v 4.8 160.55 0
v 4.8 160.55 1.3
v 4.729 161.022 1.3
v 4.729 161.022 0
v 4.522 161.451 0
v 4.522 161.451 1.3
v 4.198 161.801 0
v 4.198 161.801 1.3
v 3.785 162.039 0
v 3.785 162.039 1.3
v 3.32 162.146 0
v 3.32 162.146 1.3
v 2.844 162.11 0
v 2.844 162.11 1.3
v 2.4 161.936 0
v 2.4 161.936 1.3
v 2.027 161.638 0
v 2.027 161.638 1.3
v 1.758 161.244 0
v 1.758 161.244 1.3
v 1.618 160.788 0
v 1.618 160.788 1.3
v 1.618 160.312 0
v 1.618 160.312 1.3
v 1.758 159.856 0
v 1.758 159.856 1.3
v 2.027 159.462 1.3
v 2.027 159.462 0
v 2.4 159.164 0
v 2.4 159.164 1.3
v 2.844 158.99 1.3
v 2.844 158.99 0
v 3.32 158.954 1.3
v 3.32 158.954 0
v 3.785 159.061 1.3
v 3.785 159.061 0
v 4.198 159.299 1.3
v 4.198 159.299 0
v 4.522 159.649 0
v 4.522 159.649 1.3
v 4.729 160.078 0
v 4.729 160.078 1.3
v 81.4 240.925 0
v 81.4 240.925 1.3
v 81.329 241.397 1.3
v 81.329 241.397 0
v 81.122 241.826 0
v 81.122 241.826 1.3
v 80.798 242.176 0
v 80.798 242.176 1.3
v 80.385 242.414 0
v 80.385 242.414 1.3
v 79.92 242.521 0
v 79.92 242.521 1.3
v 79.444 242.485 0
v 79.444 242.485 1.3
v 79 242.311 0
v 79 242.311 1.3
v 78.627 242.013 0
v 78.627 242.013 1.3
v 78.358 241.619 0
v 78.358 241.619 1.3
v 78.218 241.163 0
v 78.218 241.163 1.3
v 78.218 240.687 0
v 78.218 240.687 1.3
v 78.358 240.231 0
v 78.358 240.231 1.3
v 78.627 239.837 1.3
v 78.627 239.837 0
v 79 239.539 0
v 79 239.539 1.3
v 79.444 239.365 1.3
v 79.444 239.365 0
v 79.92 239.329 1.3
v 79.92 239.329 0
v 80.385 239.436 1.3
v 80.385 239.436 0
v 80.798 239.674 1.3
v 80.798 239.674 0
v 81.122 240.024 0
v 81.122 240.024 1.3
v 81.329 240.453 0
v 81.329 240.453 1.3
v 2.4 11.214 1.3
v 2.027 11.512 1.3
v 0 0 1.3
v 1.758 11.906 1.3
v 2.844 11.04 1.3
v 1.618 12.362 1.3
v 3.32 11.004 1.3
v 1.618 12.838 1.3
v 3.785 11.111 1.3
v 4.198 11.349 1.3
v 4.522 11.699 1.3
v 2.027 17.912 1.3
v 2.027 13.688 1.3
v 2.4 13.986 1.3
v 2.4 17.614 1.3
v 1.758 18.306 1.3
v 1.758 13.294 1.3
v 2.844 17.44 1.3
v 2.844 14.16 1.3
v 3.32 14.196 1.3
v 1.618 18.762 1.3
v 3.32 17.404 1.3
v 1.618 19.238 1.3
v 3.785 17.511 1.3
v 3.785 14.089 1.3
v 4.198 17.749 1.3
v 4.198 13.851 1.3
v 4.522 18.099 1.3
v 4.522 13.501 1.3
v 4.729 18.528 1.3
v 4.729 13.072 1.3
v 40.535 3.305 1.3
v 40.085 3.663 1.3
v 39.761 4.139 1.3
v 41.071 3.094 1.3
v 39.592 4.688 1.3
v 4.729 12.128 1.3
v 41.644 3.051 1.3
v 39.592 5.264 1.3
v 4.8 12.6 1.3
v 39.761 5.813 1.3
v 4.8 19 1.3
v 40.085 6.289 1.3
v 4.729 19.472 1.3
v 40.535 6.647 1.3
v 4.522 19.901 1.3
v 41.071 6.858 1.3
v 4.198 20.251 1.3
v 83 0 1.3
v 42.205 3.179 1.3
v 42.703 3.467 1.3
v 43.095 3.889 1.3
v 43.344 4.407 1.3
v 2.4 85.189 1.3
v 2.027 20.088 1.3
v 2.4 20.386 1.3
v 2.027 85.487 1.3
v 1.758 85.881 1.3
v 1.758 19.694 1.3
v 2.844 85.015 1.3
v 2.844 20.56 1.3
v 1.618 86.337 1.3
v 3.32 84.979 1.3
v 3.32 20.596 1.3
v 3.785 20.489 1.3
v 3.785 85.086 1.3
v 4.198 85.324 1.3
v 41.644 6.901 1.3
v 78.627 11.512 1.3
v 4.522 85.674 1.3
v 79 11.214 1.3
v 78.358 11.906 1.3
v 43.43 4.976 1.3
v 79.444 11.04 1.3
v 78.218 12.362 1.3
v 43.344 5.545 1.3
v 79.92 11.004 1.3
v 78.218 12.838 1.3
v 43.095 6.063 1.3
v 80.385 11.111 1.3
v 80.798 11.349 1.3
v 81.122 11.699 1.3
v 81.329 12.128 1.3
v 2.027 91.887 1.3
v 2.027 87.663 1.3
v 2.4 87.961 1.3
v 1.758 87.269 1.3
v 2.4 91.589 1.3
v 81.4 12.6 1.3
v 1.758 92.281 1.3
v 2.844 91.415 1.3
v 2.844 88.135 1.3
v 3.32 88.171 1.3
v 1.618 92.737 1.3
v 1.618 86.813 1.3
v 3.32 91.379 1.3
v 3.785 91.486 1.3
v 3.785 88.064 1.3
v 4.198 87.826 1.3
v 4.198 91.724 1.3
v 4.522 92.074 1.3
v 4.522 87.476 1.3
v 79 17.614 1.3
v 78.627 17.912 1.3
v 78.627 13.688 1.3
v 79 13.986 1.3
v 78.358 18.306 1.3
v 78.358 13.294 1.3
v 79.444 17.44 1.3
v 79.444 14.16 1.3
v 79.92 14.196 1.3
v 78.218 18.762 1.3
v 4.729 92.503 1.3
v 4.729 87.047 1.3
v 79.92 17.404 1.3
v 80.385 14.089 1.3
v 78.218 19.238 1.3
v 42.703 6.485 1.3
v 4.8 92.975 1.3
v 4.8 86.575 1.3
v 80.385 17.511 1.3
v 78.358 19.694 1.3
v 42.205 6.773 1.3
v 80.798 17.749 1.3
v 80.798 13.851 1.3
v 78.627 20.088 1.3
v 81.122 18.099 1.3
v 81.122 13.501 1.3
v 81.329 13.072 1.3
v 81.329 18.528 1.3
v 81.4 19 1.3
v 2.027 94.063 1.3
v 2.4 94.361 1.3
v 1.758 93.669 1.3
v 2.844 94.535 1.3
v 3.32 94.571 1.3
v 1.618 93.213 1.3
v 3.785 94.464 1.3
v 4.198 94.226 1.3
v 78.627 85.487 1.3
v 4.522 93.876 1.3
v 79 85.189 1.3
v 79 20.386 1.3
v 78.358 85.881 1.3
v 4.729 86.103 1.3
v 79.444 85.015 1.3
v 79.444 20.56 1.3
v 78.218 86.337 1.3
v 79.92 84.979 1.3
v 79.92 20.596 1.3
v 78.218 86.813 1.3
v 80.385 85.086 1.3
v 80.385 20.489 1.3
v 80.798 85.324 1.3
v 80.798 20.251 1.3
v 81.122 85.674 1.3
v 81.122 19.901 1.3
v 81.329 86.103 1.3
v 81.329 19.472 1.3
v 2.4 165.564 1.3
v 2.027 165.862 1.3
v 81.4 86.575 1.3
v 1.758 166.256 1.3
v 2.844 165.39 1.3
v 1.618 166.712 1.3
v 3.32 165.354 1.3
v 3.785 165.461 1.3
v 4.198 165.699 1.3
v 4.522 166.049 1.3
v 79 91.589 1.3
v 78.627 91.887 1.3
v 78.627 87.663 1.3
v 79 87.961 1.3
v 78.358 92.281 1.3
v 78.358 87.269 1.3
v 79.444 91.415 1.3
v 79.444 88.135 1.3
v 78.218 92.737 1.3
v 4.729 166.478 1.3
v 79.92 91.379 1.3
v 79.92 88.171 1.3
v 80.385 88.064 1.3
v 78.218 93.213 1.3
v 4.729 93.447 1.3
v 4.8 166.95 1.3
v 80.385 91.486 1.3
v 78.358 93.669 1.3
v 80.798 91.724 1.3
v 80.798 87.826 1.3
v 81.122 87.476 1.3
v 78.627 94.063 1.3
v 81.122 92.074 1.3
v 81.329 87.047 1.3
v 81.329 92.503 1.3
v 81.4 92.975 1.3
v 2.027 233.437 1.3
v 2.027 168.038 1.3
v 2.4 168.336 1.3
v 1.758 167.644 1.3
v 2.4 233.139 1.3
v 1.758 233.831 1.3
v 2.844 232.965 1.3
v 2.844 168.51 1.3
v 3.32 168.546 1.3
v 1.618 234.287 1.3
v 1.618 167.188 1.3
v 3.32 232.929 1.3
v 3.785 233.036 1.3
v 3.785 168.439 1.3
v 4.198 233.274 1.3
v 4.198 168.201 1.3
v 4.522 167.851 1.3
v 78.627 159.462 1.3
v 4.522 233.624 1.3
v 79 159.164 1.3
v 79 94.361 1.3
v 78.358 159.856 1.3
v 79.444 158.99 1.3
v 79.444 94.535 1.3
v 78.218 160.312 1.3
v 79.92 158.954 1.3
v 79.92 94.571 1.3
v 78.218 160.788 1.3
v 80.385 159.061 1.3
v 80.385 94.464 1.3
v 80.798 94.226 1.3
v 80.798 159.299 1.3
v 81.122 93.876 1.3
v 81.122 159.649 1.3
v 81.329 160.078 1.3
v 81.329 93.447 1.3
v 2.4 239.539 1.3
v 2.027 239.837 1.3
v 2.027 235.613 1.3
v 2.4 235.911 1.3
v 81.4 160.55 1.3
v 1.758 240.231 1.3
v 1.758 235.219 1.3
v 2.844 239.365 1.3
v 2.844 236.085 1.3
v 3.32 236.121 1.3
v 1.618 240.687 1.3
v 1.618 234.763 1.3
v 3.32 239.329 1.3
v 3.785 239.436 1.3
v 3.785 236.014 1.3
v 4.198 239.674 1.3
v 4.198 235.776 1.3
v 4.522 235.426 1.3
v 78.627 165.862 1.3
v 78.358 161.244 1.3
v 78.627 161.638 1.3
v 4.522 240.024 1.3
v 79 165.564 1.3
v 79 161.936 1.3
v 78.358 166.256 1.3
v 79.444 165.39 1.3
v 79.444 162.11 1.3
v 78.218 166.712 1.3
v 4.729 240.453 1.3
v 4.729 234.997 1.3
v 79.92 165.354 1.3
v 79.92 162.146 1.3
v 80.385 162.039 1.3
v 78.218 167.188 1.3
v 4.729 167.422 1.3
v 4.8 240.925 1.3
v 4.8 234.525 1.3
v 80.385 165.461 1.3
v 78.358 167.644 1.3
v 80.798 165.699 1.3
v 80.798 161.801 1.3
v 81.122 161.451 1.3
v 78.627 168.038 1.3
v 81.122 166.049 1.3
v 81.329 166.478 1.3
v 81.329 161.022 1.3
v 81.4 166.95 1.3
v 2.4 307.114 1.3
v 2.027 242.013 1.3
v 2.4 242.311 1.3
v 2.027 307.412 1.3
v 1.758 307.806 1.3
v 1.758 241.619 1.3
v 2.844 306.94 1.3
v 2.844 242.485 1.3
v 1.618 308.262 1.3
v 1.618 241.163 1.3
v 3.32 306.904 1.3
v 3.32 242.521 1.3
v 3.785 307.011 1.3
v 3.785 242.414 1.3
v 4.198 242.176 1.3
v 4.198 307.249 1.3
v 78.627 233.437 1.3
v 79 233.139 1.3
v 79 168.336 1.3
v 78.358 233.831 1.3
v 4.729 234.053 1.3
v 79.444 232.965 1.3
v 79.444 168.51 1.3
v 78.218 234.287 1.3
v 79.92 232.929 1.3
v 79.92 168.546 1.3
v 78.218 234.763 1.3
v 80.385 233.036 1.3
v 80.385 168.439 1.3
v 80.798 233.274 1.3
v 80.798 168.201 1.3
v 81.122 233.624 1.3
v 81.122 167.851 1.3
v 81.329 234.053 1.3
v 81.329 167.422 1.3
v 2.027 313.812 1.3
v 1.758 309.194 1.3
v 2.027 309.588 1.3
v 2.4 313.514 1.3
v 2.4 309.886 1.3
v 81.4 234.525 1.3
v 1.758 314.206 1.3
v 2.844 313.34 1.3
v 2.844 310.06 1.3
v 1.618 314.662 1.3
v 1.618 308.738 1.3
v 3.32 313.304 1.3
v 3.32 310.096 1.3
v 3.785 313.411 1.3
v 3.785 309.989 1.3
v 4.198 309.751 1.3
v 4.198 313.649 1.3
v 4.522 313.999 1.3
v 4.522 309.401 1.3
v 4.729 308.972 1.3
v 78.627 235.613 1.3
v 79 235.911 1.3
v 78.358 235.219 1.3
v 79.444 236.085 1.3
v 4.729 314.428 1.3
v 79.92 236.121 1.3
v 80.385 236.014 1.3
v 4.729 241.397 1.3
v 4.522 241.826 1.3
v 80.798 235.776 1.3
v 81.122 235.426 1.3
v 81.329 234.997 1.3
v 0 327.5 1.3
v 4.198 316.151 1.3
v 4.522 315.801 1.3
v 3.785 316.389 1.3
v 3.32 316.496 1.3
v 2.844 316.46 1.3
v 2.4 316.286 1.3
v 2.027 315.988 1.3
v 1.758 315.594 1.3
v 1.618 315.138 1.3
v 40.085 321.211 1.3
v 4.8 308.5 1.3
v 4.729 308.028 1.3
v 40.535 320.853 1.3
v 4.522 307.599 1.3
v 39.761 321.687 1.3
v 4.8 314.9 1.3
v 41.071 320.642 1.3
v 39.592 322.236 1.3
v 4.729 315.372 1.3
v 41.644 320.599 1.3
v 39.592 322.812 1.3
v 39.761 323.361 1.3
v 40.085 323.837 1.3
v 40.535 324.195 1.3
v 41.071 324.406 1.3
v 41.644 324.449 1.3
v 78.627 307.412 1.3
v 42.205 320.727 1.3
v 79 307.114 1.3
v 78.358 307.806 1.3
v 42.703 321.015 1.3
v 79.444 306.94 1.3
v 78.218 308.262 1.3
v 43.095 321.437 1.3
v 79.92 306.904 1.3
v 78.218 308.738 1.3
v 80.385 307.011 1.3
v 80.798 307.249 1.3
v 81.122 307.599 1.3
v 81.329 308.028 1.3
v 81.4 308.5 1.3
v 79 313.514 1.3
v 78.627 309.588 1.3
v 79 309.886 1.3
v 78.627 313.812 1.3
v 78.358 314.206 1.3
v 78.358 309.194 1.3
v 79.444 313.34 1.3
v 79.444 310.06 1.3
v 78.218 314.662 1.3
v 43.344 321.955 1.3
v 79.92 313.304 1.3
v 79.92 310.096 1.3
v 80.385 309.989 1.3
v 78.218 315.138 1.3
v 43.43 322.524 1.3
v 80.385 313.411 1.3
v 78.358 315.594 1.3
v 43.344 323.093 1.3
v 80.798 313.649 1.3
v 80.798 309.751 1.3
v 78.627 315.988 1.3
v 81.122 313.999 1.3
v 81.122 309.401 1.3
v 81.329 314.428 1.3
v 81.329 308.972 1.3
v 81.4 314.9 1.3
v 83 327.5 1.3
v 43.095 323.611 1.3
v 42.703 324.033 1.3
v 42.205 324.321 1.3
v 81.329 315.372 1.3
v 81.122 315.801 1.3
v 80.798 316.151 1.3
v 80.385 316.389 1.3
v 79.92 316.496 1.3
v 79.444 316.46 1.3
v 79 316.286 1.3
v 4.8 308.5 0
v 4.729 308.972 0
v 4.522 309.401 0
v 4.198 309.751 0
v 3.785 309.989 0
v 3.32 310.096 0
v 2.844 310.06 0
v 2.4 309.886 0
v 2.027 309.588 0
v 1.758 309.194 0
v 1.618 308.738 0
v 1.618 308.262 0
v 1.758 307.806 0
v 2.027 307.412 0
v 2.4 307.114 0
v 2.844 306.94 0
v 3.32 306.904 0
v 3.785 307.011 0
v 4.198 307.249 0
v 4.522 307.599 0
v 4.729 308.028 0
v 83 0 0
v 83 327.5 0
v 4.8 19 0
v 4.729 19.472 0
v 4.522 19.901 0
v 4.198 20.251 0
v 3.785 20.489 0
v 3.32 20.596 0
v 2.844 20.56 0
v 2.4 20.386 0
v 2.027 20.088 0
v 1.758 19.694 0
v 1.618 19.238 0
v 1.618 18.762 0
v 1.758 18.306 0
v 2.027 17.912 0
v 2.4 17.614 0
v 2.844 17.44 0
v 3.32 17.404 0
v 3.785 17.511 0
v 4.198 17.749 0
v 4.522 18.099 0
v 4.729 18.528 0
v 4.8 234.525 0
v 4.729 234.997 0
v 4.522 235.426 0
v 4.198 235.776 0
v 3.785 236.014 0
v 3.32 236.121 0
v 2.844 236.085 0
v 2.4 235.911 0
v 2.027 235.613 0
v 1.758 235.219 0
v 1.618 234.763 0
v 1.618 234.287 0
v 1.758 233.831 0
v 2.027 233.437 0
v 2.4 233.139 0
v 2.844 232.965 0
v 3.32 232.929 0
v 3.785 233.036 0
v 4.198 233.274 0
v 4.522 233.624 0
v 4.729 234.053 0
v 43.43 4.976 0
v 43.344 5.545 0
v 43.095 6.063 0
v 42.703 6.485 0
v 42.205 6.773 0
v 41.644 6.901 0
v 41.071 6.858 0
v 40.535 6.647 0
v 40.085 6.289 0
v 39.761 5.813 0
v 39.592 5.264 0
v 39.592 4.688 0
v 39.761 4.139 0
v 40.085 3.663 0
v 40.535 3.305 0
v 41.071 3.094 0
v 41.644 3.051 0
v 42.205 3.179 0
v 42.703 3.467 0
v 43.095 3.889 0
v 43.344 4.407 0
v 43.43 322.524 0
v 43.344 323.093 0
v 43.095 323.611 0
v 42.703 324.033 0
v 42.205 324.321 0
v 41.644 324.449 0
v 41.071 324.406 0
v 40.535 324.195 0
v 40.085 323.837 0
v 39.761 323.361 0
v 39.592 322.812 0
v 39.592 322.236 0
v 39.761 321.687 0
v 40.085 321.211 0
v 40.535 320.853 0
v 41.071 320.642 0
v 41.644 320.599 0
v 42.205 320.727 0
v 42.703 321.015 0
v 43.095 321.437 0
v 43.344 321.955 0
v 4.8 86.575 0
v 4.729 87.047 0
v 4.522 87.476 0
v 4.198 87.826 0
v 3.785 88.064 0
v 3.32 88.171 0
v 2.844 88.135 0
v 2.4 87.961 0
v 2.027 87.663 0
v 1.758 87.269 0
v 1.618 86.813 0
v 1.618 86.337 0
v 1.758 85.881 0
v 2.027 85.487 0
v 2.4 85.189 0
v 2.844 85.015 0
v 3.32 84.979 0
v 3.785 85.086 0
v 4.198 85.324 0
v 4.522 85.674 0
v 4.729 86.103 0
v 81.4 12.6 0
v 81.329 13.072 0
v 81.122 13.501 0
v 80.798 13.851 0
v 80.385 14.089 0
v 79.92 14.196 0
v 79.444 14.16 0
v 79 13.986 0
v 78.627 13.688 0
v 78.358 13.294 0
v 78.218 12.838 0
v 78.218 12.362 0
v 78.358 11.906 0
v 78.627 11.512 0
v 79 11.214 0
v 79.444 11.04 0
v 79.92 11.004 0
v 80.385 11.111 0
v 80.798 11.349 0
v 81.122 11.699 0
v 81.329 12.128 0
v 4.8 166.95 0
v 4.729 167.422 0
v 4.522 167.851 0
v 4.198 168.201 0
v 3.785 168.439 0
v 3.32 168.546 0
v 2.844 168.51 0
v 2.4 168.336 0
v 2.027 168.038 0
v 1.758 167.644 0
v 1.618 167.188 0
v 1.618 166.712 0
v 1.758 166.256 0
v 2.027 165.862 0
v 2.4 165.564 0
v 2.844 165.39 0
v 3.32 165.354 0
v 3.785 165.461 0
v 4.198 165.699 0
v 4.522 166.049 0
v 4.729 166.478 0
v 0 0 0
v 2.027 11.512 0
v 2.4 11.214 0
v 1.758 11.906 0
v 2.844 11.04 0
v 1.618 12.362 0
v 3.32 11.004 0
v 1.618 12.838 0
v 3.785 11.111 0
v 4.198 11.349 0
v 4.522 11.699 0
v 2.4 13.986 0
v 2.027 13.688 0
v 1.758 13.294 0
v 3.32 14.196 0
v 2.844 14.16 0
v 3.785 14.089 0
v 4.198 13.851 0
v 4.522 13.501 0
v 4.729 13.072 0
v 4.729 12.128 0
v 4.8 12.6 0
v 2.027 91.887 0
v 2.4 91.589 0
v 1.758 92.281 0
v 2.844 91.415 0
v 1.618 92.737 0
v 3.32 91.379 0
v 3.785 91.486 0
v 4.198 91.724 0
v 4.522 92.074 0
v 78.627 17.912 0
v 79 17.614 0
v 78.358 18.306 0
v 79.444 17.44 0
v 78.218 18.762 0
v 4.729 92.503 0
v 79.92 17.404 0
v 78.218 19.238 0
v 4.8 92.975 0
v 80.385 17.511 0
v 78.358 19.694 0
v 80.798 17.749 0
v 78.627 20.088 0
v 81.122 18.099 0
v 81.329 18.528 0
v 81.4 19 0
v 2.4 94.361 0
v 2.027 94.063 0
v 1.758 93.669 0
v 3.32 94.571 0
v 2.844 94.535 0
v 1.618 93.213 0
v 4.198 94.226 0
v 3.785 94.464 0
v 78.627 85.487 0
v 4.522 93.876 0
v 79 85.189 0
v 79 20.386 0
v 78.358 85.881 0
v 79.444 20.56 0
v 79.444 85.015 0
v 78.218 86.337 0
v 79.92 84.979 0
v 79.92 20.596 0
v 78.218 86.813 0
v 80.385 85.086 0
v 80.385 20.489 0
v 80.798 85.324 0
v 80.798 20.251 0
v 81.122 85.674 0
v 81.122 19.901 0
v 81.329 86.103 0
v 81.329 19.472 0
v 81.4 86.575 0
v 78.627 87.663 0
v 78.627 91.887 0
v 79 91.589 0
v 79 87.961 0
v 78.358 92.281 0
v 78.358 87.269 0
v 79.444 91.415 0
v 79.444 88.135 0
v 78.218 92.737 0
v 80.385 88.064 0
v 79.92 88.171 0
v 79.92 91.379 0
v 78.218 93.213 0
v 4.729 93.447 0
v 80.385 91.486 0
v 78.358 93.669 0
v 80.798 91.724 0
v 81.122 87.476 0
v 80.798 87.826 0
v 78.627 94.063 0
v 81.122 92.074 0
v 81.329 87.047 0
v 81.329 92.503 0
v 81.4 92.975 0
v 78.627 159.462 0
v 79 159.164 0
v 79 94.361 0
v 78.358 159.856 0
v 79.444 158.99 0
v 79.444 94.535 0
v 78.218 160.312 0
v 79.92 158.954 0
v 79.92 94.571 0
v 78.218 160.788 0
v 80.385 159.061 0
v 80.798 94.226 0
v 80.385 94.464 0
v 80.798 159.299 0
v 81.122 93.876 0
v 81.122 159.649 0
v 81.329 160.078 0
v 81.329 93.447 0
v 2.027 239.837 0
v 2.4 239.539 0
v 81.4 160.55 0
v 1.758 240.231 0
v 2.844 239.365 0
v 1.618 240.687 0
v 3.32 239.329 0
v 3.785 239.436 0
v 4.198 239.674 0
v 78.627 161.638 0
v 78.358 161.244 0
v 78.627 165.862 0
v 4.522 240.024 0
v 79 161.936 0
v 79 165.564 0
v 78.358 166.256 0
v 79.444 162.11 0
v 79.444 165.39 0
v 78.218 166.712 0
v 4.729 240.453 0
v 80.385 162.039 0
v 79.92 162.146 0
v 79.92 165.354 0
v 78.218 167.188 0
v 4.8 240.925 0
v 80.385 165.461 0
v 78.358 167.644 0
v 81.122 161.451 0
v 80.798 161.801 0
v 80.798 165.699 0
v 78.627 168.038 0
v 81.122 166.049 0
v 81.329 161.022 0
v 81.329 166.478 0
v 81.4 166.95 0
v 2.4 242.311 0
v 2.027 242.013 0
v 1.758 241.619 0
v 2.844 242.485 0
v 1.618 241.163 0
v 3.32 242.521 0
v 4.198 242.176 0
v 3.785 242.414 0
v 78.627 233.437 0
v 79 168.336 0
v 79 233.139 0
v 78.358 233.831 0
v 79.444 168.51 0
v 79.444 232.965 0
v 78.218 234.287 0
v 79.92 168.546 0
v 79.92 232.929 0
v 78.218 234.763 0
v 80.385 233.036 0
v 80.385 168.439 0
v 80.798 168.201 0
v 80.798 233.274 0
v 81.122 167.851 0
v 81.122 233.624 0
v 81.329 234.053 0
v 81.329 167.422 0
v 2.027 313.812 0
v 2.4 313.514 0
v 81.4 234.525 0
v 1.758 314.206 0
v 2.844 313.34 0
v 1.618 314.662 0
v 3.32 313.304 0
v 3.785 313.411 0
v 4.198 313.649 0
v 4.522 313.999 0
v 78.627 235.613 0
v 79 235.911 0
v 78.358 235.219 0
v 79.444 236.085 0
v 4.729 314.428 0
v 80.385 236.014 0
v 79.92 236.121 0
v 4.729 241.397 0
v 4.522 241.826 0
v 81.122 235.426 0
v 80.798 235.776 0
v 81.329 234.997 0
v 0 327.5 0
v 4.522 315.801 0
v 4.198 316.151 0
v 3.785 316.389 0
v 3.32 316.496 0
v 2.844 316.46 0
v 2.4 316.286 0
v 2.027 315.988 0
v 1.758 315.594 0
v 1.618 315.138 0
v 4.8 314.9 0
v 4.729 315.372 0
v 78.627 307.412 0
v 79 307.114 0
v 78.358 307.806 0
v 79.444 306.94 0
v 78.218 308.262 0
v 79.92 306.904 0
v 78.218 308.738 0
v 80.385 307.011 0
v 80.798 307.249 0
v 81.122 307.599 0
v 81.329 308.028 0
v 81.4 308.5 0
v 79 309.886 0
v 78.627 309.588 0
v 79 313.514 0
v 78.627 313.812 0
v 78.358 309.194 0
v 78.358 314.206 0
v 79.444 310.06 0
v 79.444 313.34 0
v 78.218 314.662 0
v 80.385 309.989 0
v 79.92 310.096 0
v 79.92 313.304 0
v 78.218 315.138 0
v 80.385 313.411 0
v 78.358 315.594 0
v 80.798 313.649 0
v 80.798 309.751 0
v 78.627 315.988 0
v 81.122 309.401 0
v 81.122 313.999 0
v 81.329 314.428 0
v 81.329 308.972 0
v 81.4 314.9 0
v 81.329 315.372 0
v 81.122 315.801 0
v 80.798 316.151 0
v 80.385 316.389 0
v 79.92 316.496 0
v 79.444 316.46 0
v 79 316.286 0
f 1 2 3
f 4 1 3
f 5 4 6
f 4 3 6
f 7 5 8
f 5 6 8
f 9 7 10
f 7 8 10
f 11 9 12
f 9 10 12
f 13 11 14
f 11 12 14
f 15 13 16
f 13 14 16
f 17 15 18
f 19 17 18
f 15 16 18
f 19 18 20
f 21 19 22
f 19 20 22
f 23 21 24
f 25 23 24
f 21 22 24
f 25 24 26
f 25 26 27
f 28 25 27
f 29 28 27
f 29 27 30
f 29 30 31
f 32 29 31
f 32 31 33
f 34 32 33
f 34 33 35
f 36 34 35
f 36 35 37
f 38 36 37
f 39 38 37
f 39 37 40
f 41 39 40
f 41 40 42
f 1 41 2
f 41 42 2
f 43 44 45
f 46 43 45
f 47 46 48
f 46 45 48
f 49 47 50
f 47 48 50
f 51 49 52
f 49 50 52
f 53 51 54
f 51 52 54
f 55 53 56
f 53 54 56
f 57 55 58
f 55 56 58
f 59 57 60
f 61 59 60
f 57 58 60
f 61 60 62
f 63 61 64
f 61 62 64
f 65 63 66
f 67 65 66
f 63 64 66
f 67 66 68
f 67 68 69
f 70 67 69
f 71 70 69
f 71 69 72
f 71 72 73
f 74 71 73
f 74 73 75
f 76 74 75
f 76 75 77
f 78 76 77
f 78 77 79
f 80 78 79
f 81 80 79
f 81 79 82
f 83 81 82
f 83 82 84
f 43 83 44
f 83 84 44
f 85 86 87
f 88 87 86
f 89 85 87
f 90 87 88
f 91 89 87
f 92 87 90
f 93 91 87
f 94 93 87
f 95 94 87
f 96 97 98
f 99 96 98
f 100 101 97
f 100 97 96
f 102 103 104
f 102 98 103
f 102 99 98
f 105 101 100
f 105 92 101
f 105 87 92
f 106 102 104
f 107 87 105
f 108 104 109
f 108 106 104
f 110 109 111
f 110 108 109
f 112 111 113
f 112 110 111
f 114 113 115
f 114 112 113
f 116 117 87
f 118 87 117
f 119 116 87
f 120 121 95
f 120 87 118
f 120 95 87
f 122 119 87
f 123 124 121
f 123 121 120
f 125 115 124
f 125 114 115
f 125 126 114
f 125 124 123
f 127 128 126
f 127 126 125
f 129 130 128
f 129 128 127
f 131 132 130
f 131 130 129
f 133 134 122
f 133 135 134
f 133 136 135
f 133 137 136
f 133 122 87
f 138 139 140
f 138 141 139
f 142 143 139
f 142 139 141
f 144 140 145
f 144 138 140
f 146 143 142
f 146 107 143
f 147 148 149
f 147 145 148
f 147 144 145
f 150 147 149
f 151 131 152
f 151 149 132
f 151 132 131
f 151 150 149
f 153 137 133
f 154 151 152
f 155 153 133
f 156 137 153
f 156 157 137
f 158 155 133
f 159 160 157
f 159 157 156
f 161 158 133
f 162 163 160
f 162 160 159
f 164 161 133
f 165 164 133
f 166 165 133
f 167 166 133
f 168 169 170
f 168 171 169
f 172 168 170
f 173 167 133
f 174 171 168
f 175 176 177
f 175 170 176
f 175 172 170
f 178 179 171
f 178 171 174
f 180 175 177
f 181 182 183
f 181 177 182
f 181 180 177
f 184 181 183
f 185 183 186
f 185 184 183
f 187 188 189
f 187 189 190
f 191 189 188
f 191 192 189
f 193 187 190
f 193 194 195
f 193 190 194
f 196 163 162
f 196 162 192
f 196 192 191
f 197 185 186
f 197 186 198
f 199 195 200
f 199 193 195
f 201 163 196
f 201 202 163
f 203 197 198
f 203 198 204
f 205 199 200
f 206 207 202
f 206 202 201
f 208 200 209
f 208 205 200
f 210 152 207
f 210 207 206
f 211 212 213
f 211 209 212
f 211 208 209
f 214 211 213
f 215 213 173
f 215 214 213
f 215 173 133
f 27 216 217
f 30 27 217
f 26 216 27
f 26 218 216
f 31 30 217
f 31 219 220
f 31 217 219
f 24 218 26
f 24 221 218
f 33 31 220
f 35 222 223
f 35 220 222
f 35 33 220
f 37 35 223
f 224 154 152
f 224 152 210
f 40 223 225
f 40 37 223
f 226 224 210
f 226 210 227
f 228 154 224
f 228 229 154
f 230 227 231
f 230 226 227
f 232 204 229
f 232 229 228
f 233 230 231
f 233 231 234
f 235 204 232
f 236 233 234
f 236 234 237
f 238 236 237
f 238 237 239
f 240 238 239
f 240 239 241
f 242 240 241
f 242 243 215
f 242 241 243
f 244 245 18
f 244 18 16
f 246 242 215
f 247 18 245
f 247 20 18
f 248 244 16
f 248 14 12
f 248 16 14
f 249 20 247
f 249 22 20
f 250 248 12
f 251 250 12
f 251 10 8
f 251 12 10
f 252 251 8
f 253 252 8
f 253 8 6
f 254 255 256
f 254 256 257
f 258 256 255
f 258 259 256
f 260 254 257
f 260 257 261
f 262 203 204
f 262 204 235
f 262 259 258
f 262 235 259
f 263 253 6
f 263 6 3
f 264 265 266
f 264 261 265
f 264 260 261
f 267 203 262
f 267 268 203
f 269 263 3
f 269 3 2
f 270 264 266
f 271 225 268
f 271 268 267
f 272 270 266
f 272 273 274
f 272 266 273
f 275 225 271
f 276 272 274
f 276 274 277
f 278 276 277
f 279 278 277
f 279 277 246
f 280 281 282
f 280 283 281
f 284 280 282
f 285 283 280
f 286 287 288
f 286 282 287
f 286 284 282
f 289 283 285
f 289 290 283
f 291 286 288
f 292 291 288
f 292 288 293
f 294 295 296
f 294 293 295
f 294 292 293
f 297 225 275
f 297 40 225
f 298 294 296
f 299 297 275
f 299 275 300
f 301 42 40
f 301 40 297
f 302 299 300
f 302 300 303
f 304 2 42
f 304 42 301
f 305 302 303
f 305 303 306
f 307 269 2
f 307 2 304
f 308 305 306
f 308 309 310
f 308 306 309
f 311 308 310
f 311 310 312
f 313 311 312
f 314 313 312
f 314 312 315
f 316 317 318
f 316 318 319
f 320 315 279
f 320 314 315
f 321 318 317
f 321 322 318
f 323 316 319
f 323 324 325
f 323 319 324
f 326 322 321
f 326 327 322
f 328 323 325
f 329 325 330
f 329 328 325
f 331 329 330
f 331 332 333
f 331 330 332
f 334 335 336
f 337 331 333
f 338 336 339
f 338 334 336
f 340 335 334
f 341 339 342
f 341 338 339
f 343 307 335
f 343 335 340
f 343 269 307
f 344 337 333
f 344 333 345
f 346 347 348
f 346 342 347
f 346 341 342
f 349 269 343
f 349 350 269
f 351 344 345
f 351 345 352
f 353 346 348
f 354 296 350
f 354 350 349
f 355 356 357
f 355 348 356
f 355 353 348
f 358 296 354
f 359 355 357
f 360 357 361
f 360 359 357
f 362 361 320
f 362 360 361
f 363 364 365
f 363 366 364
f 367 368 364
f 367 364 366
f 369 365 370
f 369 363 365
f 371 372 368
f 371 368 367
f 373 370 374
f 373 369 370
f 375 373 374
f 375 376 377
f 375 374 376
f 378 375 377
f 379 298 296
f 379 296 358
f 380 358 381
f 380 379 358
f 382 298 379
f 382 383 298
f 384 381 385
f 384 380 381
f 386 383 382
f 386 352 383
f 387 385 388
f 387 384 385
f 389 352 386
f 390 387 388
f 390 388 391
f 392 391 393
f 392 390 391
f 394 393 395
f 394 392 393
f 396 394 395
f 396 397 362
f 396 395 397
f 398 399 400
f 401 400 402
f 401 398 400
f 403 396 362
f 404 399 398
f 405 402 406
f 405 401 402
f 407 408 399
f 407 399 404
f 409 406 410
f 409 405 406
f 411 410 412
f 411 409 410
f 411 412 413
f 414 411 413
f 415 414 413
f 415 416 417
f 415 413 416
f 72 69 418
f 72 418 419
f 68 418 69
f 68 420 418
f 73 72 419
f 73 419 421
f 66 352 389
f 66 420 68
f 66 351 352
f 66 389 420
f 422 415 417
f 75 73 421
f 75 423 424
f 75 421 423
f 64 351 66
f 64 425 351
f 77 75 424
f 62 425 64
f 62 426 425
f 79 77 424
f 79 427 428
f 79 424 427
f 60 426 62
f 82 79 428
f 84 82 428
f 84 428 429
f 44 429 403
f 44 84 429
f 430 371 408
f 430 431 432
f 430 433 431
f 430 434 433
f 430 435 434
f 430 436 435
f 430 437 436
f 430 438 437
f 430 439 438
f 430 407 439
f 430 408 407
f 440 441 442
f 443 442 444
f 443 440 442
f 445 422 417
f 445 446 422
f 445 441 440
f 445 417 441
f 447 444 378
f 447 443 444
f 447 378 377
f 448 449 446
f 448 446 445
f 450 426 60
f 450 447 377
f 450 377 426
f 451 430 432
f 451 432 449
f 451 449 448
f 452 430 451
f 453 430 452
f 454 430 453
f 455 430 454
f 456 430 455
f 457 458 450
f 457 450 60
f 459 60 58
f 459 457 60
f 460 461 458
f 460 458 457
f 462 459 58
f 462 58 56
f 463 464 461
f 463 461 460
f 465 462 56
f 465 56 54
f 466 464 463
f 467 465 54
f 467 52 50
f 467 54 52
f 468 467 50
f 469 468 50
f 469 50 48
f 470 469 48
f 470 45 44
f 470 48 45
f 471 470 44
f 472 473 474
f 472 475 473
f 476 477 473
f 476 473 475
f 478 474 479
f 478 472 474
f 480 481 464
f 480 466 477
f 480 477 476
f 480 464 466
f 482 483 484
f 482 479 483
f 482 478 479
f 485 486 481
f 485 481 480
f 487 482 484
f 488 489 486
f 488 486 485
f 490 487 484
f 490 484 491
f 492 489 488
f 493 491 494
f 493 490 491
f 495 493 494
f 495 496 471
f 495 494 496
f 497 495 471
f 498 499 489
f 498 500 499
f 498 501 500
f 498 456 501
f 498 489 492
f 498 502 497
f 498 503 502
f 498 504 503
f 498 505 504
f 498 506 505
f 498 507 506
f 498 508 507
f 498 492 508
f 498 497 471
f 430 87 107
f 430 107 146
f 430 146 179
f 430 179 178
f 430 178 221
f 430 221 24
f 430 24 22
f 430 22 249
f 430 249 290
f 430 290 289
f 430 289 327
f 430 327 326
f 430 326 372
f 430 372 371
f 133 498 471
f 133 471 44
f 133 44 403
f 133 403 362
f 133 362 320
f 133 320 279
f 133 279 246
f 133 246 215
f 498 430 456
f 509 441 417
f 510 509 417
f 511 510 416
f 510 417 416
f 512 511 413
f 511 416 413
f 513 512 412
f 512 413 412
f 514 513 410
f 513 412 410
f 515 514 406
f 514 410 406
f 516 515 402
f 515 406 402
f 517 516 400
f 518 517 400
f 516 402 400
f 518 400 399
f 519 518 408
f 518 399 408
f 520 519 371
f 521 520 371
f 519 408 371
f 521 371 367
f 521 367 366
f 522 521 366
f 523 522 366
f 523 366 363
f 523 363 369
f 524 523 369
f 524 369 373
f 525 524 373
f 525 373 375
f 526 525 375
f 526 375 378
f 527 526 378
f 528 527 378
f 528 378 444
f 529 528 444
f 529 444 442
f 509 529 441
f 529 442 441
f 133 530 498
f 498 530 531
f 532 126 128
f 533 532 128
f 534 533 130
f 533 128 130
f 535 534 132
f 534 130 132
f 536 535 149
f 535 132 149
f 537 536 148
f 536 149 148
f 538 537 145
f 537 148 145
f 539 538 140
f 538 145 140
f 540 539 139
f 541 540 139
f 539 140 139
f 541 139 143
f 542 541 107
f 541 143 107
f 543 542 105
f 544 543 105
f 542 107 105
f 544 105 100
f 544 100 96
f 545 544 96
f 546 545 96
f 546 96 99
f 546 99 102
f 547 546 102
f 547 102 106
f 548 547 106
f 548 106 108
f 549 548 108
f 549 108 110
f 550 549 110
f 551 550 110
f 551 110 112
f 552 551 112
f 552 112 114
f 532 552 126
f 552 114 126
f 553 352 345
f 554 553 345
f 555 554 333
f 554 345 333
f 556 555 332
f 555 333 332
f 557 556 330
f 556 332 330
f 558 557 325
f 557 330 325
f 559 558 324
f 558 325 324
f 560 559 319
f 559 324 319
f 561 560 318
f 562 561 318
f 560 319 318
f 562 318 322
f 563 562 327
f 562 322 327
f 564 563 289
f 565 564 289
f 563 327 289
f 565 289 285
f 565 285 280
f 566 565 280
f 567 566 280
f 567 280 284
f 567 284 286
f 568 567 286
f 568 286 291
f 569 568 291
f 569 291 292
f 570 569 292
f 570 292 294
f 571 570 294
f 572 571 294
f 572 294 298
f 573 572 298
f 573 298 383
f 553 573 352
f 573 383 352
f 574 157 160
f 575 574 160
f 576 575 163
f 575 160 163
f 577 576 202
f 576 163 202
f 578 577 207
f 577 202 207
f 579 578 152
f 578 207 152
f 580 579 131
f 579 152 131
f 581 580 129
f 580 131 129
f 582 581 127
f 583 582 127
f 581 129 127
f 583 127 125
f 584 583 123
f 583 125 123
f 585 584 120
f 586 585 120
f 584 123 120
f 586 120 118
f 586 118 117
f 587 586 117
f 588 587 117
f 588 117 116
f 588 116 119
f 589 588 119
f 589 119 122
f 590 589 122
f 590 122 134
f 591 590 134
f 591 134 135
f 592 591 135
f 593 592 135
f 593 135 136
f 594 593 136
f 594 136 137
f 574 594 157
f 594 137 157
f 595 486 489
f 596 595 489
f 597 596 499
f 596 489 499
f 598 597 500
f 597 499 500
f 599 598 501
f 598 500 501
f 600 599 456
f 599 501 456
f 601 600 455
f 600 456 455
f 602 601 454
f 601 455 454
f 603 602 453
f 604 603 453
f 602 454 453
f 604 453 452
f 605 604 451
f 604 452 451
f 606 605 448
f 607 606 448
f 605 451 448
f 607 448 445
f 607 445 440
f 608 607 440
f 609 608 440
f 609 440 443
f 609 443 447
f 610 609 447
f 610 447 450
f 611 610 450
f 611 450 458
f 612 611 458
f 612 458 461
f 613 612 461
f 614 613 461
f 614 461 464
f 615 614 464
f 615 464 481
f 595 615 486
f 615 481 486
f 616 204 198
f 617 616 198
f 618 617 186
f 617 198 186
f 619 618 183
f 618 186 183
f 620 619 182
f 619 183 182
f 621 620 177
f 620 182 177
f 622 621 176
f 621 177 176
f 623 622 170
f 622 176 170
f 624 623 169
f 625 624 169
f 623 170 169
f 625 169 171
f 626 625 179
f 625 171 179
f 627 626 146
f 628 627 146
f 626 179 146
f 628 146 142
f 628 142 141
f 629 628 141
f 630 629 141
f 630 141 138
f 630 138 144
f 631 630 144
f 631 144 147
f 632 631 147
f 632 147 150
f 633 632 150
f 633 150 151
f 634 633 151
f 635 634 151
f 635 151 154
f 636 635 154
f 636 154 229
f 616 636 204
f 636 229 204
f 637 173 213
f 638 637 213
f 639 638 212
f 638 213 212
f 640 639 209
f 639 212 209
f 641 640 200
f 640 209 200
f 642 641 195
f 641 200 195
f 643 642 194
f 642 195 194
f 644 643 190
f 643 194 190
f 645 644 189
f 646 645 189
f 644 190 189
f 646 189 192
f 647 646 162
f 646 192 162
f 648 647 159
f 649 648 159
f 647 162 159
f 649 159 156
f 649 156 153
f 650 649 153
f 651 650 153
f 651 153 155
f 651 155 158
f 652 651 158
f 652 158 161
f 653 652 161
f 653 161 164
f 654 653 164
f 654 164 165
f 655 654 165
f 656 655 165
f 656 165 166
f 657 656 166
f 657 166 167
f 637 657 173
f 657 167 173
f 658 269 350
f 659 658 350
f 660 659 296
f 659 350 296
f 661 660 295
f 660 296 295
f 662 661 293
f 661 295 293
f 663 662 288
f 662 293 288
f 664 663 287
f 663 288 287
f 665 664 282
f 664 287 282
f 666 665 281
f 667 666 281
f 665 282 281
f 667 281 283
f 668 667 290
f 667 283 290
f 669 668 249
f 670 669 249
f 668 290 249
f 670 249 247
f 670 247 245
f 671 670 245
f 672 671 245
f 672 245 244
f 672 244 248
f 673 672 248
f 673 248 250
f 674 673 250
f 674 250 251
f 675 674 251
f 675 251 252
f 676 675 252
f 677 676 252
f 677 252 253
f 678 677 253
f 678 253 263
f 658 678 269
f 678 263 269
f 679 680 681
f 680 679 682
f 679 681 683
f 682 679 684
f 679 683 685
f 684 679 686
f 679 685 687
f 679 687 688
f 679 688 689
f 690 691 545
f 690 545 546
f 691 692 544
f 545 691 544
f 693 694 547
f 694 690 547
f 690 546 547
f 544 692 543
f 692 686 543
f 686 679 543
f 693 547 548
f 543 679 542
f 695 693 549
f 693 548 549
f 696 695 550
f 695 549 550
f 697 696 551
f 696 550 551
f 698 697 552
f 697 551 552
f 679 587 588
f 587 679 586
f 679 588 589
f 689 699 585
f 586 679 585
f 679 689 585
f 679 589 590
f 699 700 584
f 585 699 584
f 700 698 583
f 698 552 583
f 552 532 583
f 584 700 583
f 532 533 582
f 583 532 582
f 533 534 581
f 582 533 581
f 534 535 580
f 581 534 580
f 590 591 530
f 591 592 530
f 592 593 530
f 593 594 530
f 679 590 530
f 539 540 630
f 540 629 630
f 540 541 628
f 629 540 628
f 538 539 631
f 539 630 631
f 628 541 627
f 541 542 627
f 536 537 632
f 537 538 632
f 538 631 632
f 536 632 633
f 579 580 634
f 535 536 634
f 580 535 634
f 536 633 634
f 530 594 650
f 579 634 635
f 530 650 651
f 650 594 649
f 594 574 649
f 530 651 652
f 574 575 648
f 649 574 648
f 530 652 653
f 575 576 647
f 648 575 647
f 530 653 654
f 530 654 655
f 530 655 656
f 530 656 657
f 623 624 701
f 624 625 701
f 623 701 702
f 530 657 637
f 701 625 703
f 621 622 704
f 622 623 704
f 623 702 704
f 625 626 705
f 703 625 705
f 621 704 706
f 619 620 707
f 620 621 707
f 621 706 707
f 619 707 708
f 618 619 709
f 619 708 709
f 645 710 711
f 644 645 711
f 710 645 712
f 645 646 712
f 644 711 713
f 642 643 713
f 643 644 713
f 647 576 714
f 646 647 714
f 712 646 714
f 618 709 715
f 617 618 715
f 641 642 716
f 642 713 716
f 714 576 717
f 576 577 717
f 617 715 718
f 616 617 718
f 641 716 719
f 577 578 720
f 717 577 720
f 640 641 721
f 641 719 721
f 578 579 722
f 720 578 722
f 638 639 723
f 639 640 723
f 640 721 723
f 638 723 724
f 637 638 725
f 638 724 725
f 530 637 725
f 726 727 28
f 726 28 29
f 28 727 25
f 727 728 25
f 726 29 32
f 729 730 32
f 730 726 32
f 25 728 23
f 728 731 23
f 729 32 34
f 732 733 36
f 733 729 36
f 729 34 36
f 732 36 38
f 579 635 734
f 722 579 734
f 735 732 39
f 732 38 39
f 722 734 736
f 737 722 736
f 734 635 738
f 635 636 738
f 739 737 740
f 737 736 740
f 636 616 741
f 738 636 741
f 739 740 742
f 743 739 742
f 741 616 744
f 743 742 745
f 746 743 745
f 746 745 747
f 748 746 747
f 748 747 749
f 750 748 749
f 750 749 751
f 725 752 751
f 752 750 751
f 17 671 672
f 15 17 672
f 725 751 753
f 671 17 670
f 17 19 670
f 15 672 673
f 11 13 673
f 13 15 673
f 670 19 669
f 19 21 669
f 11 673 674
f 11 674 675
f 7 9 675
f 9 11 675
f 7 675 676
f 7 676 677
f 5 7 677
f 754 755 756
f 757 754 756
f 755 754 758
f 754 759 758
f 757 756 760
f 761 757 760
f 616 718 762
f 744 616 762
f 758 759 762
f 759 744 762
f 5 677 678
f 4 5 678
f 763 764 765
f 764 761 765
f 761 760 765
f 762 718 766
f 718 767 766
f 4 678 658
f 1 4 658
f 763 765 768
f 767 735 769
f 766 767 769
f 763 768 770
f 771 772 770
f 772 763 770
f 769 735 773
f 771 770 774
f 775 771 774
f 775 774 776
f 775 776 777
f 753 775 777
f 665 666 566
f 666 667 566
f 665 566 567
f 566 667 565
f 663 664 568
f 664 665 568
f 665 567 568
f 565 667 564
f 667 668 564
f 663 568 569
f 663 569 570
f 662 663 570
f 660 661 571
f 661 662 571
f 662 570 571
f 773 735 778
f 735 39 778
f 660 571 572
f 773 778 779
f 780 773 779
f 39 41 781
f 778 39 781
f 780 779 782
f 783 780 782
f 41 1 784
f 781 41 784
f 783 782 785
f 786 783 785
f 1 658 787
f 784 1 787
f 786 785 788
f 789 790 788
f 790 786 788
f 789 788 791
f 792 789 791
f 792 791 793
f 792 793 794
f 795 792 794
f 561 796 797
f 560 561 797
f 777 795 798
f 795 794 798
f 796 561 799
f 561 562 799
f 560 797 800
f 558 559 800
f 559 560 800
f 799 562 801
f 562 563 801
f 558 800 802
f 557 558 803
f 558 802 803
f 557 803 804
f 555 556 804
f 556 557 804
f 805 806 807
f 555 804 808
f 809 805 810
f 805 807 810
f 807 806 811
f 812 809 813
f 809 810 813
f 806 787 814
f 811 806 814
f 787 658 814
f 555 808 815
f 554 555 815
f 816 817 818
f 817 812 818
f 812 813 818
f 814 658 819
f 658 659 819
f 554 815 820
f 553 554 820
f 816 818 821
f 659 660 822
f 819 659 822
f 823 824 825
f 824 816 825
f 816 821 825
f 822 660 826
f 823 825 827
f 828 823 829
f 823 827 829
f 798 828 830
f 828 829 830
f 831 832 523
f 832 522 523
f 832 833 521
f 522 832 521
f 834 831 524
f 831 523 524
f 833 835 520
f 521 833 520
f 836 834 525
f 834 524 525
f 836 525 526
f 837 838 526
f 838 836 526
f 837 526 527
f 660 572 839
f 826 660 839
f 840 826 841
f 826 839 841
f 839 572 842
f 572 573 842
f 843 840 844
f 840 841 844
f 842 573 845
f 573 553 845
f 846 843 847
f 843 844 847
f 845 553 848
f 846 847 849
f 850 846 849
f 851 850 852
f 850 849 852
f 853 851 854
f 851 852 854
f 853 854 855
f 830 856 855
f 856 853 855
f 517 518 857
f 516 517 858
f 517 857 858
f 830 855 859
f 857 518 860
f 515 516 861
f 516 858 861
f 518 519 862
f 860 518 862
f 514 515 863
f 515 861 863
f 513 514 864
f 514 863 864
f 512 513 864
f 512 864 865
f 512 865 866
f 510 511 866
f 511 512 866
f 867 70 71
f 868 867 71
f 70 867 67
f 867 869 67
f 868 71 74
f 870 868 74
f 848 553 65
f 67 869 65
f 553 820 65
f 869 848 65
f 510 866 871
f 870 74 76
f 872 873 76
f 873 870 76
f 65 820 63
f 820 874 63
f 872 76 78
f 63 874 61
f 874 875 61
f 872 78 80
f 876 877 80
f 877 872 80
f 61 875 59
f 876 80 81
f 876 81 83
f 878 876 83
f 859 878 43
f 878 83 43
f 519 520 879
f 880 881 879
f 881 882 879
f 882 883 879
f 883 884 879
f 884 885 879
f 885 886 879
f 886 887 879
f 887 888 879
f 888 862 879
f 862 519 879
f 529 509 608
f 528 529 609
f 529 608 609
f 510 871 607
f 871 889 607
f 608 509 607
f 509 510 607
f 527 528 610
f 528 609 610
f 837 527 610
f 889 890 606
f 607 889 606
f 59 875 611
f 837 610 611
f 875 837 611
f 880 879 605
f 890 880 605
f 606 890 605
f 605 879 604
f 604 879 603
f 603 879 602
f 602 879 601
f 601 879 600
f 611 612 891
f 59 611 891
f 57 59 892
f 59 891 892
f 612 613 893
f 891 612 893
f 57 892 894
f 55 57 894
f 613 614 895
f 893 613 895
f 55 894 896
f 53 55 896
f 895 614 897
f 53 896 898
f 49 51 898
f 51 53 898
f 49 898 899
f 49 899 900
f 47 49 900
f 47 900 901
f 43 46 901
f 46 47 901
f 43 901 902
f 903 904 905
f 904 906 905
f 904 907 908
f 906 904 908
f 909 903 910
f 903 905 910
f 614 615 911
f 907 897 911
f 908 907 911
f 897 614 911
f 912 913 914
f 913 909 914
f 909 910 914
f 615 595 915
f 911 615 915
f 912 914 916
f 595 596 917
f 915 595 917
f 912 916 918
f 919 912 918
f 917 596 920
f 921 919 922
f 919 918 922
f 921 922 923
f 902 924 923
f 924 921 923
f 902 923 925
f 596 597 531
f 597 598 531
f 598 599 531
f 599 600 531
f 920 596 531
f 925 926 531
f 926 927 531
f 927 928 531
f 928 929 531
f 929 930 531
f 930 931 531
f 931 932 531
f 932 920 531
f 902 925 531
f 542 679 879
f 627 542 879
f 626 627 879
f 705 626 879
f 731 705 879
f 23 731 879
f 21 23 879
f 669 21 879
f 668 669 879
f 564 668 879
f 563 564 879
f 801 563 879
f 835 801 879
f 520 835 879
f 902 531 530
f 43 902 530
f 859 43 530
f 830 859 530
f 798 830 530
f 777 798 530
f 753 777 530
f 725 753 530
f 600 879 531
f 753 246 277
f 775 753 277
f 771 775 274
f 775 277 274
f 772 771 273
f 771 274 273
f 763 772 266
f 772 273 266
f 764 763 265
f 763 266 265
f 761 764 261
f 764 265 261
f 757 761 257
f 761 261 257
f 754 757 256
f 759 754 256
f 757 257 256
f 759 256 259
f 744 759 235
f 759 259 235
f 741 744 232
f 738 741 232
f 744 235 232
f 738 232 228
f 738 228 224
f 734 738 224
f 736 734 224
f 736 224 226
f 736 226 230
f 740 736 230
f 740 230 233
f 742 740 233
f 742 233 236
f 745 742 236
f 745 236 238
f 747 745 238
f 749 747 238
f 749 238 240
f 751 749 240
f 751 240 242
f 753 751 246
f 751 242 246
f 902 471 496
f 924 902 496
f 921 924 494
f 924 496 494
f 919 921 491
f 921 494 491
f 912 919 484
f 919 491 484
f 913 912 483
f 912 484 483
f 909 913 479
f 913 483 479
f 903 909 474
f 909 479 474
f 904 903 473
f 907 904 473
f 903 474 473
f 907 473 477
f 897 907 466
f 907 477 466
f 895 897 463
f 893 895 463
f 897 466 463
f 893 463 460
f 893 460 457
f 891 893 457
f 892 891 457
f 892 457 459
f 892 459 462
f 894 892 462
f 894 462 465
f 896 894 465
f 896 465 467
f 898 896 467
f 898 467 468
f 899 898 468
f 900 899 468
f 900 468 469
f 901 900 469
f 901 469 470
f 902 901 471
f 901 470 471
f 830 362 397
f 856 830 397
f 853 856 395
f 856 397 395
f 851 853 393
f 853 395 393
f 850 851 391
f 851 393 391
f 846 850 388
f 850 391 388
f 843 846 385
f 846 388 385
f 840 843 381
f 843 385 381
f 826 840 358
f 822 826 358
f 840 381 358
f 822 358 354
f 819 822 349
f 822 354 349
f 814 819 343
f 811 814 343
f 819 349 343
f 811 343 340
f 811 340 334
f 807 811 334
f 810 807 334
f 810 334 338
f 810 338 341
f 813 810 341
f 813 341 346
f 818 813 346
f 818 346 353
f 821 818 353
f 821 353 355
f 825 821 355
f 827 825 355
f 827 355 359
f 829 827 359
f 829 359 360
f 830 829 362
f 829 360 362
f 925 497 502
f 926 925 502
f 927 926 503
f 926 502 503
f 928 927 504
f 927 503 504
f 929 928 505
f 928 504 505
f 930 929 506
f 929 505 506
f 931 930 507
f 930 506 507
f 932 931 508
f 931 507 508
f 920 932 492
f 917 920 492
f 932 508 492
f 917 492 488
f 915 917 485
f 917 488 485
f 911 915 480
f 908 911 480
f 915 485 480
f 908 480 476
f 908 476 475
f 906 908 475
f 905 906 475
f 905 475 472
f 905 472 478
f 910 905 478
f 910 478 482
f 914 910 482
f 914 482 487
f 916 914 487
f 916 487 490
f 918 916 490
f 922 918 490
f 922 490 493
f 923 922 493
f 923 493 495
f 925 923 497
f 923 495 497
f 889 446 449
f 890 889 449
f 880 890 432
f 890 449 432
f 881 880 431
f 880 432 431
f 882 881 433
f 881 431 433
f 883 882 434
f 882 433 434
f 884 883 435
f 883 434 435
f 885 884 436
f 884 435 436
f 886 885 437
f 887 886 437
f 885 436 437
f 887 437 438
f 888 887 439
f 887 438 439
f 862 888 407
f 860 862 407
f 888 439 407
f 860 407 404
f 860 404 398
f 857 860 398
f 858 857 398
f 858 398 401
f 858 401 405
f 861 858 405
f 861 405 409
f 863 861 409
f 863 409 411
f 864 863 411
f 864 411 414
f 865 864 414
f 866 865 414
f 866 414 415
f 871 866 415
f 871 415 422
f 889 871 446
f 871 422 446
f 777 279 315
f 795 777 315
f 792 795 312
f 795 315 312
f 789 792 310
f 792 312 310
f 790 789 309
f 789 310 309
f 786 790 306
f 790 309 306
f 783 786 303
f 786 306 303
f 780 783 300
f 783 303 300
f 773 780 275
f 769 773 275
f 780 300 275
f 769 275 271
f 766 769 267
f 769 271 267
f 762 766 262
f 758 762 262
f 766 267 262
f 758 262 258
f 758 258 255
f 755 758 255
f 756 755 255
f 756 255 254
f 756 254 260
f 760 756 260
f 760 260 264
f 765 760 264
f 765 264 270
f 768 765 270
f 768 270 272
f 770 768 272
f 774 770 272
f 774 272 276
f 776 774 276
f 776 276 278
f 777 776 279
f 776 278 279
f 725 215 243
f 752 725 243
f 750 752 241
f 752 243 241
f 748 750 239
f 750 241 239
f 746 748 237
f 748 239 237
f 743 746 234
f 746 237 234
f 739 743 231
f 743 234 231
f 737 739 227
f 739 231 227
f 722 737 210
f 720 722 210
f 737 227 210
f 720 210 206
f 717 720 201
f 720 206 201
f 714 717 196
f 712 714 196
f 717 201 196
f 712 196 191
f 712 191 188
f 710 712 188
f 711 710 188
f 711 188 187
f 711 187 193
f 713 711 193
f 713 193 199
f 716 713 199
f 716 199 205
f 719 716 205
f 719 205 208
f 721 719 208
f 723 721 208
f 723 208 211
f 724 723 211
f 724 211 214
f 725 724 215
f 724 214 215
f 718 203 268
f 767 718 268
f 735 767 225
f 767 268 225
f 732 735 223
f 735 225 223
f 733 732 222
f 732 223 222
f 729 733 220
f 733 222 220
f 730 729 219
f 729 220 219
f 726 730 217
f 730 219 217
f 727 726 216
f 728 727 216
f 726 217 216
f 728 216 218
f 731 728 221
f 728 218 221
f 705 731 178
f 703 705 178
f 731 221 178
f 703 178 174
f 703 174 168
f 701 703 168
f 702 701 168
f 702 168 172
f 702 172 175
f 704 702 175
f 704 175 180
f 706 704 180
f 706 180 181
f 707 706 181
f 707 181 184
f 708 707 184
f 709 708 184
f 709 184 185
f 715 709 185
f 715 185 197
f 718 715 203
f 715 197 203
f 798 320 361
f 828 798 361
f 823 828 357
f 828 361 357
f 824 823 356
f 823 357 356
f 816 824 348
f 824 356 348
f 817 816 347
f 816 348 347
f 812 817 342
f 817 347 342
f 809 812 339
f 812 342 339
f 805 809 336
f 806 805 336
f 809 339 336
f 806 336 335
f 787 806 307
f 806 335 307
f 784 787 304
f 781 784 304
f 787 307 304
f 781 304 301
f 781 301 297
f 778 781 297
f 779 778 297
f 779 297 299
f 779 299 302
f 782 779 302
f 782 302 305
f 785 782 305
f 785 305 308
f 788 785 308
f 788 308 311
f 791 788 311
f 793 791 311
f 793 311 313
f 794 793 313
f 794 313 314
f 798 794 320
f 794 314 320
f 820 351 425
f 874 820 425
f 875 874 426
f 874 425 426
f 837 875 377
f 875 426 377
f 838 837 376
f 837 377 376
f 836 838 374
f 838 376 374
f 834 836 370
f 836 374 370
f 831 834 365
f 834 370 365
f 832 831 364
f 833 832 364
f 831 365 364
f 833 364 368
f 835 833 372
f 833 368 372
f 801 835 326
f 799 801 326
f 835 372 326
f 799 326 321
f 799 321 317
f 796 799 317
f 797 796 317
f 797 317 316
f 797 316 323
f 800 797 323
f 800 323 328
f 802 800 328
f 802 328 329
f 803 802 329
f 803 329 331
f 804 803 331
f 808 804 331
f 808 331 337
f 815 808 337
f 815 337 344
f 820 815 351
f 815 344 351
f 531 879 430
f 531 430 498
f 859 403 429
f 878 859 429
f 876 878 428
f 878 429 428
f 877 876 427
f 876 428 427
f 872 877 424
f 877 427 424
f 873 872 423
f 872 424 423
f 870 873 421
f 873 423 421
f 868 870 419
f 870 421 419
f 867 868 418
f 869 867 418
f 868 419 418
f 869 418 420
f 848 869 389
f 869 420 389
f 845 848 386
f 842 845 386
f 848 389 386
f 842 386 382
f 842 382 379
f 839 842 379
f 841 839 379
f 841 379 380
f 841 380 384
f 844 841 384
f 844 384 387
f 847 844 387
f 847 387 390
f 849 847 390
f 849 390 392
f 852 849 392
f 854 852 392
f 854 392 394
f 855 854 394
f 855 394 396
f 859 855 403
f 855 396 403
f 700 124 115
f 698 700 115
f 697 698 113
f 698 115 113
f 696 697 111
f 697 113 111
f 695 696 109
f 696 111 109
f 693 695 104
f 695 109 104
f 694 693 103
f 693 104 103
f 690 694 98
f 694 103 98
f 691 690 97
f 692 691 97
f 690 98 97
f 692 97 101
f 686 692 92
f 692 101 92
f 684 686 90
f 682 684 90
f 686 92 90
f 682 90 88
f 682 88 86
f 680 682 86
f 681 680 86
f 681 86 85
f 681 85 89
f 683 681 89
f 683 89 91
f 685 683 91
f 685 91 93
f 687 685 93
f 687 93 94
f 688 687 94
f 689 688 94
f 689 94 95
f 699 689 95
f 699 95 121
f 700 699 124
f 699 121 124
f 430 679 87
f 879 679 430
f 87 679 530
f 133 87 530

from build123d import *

# Parameters (mm, degrees)
SKETCH1_W           = 83
SKETCH1_H           = 327.5
BOSS_EXTRUDE1_DEPTH = 1.3
SKETCH2_R           = 1.6
CUT_EXTRUDE1_DEPTH  = 1.3
SKETCH3_R           = 1.93
CUT_EXTRUDE2_DEPTH  = 1.3


with BuildPart() as part:
    # Sketch1 → Boss-Extrude1 (new body)
    with BuildSketch(Plane.XY):
        with Locations((41.5, 163.75)):
            Rectangle(SKETCH1_W, SKETCH1_H)
    extrude(amount=BOSS_EXTRUDE1_DEPTH)

    # Sketch2 → Cut-Extrude1 (cut)
    with BuildSketch(Plane.XY.offset(1.3)):
        with Locations((3.2, 314.9)):
            Circle(SKETCH2_R)
        with Locations((3.2, 308.5)):
            Circle(SKETCH2_R)
        with Locations((79.8, 314.9)):
            Circle(SKETCH2_R)
        with Locations((79.8, 308.5)):
            Circle(SKETCH2_R)
        with Locations((3.2, 240.925)):
            Circle(SKETCH2_R)
        with Locations((3.2, 234.525)):
            Circle(SKETCH2_R)
        with Locations((79.8, 240.925)):
            Circle(SKETCH2_R)
        with Locations((79.8, 234.525)):
            Circle(SKETCH2_R)
        with Locations((3.2, 166.95)):
            Circle(SKETCH2_R)
        with Locations((3.2, 160.55)):
            Circle(SKETCH2_R)
        with Locations((79.8, 166.95)):
            Circle(SKETCH2_R)
        with Locations((79.8, 160.55)):
            Circle(SKETCH2_R)
        with Locations((3.2, 92.975)):
            Circle(SKETCH2_R)
        with Locations((3.2, 86.575)):
            Circle(SKETCH2_R)
        with Locations((79.8, 92.975)):
            Circle(SKETCH2_R)
        with Locations((79.8, 86.575)):
            Circle(SKETCH2_R)
        with Locations((3.2, 19)):
            Circle(SKETCH2_R)
        with Locations((3.2, 12.6)):
            Circle(SKETCH2_R)
        with Locations((79.8, 19)):
            Circle(SKETCH2_R)
        with Locations((79.8, 12.6)):
            Circle(SKETCH2_R)
    extrude(amount=-CUT_EXTRUDE1_DEPTH, mode=Mode.SUBTRACT)

    # Sketch3 → Cut-Extrude2 (cut)
    with BuildSketch(Plane.XY.offset(1.3)):
        with Locations((41.5, 322.524)):
            Circle(SKETCH3_R)
        with Locations((41.5, 4.976)):
            Circle(SKETCH3_R)
    extrude(amount=-CUT_EXTRUDE2_DEPTH, mode=Mode.SUBTRACT)


solid = part.part
